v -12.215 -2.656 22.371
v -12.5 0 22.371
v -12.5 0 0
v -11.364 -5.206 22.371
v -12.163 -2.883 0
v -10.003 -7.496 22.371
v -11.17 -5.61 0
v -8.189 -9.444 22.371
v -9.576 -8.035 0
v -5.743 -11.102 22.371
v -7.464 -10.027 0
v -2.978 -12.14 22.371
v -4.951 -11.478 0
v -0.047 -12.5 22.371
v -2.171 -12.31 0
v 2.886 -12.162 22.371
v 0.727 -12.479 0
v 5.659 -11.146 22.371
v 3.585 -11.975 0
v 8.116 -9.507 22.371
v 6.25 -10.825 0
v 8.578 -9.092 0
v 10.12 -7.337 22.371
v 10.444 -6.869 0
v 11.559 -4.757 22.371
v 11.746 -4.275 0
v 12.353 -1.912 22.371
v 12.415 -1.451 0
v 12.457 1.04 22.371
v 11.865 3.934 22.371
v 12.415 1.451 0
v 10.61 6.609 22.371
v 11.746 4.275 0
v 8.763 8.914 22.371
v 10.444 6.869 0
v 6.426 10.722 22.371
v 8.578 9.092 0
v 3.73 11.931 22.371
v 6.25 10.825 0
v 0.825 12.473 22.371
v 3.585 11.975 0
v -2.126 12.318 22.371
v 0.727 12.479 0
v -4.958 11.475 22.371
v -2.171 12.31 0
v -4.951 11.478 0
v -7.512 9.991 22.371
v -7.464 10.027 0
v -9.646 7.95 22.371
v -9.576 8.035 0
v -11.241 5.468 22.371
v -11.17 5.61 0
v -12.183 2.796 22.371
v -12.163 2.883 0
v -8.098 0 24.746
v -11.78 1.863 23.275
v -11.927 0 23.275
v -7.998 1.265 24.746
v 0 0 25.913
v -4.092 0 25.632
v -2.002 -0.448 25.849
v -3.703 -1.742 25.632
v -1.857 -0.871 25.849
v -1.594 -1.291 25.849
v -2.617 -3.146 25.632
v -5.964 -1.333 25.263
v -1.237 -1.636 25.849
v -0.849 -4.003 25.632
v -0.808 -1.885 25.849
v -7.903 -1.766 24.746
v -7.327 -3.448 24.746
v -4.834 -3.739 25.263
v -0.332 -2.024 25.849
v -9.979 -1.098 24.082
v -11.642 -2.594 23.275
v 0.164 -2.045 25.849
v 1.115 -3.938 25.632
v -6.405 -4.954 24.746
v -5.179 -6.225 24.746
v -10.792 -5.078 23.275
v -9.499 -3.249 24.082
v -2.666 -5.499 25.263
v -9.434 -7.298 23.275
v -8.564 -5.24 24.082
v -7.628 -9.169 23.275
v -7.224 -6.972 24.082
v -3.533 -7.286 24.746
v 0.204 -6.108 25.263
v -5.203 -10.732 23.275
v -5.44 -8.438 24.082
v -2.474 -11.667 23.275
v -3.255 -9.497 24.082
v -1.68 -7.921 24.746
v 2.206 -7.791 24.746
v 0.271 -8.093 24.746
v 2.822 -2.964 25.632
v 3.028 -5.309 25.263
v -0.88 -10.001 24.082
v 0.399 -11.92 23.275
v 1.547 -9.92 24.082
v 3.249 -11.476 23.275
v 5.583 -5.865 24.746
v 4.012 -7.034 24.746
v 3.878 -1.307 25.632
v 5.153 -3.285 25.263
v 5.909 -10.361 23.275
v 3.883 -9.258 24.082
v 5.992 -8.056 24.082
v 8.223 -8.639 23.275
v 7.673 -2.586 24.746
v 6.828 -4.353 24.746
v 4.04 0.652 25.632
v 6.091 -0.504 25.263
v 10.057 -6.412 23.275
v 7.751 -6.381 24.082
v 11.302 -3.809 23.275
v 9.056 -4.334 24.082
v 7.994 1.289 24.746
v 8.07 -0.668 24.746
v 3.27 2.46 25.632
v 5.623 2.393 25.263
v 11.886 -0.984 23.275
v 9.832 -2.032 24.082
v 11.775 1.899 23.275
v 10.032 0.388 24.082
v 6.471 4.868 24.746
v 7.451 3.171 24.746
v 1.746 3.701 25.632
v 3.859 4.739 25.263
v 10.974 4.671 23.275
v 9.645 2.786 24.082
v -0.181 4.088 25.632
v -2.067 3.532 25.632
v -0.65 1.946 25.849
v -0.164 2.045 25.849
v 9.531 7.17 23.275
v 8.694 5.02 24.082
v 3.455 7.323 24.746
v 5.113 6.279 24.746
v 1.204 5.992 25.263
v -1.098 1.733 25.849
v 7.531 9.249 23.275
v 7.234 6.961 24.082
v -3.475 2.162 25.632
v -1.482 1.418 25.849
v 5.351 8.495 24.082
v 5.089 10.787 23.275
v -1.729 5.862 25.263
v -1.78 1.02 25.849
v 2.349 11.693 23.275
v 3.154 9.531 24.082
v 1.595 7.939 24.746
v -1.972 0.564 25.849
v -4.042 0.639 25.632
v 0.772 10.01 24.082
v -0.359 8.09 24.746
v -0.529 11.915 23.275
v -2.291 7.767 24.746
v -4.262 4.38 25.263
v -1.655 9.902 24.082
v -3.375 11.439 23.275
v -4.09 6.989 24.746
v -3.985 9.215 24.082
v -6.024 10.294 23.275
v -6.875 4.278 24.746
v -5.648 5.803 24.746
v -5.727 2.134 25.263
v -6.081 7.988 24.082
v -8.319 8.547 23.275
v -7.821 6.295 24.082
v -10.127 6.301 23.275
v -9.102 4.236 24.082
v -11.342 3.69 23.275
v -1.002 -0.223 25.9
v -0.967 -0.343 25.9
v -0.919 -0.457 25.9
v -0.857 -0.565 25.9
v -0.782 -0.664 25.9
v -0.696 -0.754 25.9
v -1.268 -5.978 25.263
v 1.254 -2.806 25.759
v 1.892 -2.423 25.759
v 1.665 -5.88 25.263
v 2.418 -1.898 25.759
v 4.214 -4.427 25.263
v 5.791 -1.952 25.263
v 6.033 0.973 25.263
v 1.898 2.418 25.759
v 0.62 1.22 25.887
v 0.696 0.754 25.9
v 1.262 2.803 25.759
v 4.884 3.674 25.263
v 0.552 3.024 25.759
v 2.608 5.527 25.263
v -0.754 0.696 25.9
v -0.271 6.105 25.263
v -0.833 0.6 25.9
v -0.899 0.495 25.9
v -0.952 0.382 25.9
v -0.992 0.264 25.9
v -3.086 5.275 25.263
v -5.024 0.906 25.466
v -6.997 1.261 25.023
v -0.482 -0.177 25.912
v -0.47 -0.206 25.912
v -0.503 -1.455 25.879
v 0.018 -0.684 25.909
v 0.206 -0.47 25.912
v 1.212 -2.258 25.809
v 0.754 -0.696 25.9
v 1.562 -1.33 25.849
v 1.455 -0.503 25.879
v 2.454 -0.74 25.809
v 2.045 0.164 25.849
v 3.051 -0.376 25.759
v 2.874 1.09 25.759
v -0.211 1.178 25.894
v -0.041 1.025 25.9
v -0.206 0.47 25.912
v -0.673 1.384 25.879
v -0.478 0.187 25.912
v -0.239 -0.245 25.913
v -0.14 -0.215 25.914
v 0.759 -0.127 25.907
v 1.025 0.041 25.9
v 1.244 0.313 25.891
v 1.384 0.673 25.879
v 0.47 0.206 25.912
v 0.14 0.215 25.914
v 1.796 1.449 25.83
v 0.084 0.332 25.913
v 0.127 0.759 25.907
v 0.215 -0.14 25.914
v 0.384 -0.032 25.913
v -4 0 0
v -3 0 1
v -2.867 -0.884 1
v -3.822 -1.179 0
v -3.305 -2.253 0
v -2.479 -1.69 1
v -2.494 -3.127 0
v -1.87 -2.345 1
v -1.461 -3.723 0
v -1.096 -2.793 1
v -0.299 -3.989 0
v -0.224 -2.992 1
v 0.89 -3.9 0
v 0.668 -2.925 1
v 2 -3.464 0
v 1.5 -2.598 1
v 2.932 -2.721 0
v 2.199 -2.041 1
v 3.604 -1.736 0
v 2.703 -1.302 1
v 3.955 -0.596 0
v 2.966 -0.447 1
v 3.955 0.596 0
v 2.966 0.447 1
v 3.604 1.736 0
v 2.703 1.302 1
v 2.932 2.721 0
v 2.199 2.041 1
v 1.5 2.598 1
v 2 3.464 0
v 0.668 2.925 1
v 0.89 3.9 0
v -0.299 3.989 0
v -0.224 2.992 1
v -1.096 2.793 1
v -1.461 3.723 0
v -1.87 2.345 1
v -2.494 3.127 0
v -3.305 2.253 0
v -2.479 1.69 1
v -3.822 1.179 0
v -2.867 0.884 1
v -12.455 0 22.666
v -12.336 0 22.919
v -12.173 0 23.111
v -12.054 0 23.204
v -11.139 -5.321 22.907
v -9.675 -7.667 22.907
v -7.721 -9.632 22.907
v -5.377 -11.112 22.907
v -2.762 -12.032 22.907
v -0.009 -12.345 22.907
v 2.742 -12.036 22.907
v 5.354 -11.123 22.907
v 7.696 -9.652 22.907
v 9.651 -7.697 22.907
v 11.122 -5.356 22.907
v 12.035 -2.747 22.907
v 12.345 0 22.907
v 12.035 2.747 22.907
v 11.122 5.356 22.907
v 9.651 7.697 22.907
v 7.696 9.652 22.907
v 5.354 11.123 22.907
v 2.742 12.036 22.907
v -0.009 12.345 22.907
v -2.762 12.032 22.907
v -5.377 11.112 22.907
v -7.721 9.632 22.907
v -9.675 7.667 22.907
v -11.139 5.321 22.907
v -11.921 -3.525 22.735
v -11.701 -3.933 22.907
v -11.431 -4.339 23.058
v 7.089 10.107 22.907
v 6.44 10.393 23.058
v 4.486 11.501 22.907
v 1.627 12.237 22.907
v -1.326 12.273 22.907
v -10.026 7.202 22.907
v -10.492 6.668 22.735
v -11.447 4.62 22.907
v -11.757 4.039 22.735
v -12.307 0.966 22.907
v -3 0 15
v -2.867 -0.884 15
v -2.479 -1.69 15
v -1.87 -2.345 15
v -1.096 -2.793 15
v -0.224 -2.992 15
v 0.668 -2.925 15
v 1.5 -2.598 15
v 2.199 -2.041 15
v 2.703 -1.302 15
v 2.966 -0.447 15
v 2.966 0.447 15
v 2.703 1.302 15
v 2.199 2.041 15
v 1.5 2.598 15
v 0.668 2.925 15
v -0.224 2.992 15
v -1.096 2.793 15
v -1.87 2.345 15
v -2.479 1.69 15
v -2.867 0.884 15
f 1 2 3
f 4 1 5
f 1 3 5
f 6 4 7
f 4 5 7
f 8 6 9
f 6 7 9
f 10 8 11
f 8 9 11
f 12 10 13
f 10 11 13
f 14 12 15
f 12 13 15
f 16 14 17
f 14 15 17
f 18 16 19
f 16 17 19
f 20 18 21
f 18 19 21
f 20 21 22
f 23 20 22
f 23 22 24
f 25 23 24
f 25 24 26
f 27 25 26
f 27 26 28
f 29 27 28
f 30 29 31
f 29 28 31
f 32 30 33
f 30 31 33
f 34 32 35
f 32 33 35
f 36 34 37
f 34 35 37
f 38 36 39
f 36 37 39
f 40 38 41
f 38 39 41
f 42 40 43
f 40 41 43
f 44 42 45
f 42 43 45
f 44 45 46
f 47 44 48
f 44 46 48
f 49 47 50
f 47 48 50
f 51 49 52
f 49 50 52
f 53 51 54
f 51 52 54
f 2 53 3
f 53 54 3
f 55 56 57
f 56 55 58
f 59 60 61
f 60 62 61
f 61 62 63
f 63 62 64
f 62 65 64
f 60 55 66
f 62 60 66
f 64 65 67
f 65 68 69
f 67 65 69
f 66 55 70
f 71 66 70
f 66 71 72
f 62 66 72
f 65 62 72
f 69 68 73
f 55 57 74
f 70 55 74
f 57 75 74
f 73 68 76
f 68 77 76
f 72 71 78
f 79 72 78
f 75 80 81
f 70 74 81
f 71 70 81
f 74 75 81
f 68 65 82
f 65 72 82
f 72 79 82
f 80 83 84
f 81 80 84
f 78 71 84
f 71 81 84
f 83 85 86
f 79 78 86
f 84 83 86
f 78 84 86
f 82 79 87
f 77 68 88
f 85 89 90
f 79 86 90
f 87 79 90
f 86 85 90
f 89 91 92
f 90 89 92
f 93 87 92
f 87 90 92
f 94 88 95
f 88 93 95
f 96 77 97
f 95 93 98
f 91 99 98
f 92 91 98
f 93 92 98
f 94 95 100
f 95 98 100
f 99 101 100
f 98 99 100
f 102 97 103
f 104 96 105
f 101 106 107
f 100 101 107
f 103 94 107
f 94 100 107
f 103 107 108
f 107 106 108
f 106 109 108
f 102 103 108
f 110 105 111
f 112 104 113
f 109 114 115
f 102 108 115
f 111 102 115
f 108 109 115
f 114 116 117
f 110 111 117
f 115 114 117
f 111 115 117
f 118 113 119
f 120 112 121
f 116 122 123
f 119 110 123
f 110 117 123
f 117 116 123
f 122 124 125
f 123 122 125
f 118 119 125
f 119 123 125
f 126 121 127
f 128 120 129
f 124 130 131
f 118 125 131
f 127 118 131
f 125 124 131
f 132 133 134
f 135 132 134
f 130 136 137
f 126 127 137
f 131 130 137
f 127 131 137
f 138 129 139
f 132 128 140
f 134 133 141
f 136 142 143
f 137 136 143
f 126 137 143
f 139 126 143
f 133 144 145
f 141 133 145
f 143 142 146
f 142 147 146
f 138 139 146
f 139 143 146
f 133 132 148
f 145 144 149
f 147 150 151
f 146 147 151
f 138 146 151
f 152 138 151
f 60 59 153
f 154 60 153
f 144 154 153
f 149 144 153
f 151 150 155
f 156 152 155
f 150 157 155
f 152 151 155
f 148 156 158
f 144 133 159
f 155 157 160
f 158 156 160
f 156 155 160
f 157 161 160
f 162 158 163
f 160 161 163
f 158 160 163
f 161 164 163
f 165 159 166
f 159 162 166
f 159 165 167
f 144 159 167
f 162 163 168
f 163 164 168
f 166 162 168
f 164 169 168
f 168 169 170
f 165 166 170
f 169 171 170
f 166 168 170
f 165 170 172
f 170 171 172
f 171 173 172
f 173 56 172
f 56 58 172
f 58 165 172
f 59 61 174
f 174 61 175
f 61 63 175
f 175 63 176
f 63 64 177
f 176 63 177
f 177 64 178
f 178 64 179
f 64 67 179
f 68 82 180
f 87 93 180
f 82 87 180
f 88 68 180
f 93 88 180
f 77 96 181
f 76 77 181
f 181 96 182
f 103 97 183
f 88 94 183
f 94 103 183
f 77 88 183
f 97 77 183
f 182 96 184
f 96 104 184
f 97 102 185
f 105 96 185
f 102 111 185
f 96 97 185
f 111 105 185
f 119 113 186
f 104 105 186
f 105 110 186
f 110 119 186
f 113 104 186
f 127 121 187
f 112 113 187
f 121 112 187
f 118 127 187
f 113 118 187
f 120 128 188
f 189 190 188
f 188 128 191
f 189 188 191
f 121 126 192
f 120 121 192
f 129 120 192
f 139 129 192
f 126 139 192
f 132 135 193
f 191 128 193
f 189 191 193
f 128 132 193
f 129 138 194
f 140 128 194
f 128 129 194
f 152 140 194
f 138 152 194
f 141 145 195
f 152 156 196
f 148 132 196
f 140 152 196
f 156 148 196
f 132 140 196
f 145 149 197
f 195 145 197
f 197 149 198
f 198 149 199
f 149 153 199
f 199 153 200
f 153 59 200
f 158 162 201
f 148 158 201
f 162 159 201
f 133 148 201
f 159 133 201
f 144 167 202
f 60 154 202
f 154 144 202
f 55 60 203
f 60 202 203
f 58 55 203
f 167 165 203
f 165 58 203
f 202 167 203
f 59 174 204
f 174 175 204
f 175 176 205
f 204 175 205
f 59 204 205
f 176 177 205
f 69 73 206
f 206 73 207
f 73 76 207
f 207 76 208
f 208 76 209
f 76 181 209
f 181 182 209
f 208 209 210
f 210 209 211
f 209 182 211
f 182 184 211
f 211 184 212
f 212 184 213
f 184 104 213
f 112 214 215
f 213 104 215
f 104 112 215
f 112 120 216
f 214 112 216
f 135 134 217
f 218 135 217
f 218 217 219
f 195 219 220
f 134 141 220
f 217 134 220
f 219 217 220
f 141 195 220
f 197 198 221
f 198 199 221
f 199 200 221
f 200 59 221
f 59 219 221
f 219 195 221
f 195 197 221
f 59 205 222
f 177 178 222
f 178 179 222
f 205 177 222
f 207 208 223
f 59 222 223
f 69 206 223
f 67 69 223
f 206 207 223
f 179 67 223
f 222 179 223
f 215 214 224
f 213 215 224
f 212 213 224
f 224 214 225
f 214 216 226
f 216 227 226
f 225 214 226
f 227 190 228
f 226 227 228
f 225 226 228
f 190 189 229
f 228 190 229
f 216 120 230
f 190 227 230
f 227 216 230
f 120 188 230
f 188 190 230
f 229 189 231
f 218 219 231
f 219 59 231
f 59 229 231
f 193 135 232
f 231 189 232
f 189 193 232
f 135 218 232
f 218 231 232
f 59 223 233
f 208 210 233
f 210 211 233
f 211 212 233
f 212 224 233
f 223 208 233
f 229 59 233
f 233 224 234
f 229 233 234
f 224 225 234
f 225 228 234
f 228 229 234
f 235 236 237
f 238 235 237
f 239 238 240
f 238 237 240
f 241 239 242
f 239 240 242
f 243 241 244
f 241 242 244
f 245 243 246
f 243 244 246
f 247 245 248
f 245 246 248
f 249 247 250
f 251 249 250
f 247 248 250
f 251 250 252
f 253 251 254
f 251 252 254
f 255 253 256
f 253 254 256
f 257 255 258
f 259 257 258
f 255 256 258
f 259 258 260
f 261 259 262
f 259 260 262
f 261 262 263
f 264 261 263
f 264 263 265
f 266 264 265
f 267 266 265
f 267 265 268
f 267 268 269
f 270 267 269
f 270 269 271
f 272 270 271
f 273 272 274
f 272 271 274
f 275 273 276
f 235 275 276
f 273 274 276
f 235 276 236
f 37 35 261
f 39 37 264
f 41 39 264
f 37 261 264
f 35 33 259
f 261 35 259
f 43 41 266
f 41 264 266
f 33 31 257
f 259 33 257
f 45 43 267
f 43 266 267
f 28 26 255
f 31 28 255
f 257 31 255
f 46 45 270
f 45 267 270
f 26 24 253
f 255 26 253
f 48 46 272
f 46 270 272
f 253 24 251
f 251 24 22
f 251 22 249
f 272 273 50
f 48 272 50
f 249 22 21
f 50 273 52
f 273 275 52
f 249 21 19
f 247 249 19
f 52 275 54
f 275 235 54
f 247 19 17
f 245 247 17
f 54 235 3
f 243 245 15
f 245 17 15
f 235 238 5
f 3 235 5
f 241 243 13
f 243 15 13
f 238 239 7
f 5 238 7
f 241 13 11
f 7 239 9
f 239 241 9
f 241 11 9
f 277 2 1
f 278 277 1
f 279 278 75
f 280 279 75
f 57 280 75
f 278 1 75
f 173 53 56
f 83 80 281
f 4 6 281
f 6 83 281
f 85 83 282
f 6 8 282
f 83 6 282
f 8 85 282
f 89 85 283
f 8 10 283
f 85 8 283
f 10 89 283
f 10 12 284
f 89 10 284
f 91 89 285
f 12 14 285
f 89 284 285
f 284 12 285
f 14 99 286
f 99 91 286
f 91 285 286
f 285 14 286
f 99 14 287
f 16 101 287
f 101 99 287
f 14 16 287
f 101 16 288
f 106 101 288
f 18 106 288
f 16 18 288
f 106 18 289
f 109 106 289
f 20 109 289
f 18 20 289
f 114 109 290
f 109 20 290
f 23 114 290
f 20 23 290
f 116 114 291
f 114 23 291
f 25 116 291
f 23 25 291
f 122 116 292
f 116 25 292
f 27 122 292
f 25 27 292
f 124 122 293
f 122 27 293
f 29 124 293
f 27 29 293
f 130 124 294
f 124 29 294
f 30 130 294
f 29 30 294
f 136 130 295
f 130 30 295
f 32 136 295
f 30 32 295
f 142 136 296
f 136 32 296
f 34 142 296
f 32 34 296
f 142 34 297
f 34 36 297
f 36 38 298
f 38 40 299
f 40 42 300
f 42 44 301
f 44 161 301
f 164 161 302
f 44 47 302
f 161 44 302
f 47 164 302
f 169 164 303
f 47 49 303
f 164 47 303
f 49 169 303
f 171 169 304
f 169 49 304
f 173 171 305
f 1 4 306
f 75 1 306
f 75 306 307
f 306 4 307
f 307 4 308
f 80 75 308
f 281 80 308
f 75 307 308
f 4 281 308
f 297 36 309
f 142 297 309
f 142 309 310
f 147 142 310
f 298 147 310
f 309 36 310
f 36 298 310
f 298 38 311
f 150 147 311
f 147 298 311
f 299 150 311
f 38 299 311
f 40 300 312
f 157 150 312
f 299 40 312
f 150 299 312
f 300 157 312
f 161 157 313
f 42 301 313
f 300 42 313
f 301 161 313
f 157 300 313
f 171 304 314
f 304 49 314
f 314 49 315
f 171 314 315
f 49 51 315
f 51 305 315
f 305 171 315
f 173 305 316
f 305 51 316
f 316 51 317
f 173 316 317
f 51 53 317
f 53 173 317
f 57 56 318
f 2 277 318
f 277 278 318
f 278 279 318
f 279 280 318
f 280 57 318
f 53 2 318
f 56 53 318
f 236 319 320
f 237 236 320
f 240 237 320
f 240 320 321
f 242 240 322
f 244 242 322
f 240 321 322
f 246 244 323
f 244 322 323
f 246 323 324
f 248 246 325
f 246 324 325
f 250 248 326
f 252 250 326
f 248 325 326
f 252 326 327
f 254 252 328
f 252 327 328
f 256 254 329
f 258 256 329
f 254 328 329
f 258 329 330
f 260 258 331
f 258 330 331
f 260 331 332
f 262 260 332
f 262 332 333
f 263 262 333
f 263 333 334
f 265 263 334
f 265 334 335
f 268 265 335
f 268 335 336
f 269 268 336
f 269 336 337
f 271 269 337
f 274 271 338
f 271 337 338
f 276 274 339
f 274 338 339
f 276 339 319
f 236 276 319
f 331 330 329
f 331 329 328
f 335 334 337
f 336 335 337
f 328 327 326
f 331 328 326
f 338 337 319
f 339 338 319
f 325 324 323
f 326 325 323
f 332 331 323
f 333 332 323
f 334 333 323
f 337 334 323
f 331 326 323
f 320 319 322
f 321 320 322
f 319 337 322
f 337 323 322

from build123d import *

# Parameters (mm, degrees)
F2_SIZE = 1
F3_R    = 1


with BuildPart() as f1:
    # F0 (on Front) → F1 (revolve)
    with BuildSketch(Plane.XZ):
        with BuildLine():
            Line((-12.5, 22.996796), (-12.5, 0))
            Line((-12.5, 0), (-3, 0))
            Line((-3, 0), (-3, 15))
            Line((-3, 15), (0, 15))
            Line((0, 15), (0, 25.913464))
            ThreePointArc((0, 25.913464), (-6.422136, 25.192857), (-12.5, 22.996796))
        make_face()
    revolve(axis=Axis((0, 0, 20.456732), (0, 0, 1)))

    # F2
    f2_edges = [f1.edges().sort_by_distance(p)[0] for p in [
        (3, 0, 0),
    ]]
    chamfer(f2_edges, length=F2_SIZE)

    # F3
    f3_edges = [f1.edges().sort_by_distance(p)[0] for p in [
        (12.5, 0, 22.996796),
    ]]
    fillet(f3_edges, radius=F3_R)


solid = f1.part
